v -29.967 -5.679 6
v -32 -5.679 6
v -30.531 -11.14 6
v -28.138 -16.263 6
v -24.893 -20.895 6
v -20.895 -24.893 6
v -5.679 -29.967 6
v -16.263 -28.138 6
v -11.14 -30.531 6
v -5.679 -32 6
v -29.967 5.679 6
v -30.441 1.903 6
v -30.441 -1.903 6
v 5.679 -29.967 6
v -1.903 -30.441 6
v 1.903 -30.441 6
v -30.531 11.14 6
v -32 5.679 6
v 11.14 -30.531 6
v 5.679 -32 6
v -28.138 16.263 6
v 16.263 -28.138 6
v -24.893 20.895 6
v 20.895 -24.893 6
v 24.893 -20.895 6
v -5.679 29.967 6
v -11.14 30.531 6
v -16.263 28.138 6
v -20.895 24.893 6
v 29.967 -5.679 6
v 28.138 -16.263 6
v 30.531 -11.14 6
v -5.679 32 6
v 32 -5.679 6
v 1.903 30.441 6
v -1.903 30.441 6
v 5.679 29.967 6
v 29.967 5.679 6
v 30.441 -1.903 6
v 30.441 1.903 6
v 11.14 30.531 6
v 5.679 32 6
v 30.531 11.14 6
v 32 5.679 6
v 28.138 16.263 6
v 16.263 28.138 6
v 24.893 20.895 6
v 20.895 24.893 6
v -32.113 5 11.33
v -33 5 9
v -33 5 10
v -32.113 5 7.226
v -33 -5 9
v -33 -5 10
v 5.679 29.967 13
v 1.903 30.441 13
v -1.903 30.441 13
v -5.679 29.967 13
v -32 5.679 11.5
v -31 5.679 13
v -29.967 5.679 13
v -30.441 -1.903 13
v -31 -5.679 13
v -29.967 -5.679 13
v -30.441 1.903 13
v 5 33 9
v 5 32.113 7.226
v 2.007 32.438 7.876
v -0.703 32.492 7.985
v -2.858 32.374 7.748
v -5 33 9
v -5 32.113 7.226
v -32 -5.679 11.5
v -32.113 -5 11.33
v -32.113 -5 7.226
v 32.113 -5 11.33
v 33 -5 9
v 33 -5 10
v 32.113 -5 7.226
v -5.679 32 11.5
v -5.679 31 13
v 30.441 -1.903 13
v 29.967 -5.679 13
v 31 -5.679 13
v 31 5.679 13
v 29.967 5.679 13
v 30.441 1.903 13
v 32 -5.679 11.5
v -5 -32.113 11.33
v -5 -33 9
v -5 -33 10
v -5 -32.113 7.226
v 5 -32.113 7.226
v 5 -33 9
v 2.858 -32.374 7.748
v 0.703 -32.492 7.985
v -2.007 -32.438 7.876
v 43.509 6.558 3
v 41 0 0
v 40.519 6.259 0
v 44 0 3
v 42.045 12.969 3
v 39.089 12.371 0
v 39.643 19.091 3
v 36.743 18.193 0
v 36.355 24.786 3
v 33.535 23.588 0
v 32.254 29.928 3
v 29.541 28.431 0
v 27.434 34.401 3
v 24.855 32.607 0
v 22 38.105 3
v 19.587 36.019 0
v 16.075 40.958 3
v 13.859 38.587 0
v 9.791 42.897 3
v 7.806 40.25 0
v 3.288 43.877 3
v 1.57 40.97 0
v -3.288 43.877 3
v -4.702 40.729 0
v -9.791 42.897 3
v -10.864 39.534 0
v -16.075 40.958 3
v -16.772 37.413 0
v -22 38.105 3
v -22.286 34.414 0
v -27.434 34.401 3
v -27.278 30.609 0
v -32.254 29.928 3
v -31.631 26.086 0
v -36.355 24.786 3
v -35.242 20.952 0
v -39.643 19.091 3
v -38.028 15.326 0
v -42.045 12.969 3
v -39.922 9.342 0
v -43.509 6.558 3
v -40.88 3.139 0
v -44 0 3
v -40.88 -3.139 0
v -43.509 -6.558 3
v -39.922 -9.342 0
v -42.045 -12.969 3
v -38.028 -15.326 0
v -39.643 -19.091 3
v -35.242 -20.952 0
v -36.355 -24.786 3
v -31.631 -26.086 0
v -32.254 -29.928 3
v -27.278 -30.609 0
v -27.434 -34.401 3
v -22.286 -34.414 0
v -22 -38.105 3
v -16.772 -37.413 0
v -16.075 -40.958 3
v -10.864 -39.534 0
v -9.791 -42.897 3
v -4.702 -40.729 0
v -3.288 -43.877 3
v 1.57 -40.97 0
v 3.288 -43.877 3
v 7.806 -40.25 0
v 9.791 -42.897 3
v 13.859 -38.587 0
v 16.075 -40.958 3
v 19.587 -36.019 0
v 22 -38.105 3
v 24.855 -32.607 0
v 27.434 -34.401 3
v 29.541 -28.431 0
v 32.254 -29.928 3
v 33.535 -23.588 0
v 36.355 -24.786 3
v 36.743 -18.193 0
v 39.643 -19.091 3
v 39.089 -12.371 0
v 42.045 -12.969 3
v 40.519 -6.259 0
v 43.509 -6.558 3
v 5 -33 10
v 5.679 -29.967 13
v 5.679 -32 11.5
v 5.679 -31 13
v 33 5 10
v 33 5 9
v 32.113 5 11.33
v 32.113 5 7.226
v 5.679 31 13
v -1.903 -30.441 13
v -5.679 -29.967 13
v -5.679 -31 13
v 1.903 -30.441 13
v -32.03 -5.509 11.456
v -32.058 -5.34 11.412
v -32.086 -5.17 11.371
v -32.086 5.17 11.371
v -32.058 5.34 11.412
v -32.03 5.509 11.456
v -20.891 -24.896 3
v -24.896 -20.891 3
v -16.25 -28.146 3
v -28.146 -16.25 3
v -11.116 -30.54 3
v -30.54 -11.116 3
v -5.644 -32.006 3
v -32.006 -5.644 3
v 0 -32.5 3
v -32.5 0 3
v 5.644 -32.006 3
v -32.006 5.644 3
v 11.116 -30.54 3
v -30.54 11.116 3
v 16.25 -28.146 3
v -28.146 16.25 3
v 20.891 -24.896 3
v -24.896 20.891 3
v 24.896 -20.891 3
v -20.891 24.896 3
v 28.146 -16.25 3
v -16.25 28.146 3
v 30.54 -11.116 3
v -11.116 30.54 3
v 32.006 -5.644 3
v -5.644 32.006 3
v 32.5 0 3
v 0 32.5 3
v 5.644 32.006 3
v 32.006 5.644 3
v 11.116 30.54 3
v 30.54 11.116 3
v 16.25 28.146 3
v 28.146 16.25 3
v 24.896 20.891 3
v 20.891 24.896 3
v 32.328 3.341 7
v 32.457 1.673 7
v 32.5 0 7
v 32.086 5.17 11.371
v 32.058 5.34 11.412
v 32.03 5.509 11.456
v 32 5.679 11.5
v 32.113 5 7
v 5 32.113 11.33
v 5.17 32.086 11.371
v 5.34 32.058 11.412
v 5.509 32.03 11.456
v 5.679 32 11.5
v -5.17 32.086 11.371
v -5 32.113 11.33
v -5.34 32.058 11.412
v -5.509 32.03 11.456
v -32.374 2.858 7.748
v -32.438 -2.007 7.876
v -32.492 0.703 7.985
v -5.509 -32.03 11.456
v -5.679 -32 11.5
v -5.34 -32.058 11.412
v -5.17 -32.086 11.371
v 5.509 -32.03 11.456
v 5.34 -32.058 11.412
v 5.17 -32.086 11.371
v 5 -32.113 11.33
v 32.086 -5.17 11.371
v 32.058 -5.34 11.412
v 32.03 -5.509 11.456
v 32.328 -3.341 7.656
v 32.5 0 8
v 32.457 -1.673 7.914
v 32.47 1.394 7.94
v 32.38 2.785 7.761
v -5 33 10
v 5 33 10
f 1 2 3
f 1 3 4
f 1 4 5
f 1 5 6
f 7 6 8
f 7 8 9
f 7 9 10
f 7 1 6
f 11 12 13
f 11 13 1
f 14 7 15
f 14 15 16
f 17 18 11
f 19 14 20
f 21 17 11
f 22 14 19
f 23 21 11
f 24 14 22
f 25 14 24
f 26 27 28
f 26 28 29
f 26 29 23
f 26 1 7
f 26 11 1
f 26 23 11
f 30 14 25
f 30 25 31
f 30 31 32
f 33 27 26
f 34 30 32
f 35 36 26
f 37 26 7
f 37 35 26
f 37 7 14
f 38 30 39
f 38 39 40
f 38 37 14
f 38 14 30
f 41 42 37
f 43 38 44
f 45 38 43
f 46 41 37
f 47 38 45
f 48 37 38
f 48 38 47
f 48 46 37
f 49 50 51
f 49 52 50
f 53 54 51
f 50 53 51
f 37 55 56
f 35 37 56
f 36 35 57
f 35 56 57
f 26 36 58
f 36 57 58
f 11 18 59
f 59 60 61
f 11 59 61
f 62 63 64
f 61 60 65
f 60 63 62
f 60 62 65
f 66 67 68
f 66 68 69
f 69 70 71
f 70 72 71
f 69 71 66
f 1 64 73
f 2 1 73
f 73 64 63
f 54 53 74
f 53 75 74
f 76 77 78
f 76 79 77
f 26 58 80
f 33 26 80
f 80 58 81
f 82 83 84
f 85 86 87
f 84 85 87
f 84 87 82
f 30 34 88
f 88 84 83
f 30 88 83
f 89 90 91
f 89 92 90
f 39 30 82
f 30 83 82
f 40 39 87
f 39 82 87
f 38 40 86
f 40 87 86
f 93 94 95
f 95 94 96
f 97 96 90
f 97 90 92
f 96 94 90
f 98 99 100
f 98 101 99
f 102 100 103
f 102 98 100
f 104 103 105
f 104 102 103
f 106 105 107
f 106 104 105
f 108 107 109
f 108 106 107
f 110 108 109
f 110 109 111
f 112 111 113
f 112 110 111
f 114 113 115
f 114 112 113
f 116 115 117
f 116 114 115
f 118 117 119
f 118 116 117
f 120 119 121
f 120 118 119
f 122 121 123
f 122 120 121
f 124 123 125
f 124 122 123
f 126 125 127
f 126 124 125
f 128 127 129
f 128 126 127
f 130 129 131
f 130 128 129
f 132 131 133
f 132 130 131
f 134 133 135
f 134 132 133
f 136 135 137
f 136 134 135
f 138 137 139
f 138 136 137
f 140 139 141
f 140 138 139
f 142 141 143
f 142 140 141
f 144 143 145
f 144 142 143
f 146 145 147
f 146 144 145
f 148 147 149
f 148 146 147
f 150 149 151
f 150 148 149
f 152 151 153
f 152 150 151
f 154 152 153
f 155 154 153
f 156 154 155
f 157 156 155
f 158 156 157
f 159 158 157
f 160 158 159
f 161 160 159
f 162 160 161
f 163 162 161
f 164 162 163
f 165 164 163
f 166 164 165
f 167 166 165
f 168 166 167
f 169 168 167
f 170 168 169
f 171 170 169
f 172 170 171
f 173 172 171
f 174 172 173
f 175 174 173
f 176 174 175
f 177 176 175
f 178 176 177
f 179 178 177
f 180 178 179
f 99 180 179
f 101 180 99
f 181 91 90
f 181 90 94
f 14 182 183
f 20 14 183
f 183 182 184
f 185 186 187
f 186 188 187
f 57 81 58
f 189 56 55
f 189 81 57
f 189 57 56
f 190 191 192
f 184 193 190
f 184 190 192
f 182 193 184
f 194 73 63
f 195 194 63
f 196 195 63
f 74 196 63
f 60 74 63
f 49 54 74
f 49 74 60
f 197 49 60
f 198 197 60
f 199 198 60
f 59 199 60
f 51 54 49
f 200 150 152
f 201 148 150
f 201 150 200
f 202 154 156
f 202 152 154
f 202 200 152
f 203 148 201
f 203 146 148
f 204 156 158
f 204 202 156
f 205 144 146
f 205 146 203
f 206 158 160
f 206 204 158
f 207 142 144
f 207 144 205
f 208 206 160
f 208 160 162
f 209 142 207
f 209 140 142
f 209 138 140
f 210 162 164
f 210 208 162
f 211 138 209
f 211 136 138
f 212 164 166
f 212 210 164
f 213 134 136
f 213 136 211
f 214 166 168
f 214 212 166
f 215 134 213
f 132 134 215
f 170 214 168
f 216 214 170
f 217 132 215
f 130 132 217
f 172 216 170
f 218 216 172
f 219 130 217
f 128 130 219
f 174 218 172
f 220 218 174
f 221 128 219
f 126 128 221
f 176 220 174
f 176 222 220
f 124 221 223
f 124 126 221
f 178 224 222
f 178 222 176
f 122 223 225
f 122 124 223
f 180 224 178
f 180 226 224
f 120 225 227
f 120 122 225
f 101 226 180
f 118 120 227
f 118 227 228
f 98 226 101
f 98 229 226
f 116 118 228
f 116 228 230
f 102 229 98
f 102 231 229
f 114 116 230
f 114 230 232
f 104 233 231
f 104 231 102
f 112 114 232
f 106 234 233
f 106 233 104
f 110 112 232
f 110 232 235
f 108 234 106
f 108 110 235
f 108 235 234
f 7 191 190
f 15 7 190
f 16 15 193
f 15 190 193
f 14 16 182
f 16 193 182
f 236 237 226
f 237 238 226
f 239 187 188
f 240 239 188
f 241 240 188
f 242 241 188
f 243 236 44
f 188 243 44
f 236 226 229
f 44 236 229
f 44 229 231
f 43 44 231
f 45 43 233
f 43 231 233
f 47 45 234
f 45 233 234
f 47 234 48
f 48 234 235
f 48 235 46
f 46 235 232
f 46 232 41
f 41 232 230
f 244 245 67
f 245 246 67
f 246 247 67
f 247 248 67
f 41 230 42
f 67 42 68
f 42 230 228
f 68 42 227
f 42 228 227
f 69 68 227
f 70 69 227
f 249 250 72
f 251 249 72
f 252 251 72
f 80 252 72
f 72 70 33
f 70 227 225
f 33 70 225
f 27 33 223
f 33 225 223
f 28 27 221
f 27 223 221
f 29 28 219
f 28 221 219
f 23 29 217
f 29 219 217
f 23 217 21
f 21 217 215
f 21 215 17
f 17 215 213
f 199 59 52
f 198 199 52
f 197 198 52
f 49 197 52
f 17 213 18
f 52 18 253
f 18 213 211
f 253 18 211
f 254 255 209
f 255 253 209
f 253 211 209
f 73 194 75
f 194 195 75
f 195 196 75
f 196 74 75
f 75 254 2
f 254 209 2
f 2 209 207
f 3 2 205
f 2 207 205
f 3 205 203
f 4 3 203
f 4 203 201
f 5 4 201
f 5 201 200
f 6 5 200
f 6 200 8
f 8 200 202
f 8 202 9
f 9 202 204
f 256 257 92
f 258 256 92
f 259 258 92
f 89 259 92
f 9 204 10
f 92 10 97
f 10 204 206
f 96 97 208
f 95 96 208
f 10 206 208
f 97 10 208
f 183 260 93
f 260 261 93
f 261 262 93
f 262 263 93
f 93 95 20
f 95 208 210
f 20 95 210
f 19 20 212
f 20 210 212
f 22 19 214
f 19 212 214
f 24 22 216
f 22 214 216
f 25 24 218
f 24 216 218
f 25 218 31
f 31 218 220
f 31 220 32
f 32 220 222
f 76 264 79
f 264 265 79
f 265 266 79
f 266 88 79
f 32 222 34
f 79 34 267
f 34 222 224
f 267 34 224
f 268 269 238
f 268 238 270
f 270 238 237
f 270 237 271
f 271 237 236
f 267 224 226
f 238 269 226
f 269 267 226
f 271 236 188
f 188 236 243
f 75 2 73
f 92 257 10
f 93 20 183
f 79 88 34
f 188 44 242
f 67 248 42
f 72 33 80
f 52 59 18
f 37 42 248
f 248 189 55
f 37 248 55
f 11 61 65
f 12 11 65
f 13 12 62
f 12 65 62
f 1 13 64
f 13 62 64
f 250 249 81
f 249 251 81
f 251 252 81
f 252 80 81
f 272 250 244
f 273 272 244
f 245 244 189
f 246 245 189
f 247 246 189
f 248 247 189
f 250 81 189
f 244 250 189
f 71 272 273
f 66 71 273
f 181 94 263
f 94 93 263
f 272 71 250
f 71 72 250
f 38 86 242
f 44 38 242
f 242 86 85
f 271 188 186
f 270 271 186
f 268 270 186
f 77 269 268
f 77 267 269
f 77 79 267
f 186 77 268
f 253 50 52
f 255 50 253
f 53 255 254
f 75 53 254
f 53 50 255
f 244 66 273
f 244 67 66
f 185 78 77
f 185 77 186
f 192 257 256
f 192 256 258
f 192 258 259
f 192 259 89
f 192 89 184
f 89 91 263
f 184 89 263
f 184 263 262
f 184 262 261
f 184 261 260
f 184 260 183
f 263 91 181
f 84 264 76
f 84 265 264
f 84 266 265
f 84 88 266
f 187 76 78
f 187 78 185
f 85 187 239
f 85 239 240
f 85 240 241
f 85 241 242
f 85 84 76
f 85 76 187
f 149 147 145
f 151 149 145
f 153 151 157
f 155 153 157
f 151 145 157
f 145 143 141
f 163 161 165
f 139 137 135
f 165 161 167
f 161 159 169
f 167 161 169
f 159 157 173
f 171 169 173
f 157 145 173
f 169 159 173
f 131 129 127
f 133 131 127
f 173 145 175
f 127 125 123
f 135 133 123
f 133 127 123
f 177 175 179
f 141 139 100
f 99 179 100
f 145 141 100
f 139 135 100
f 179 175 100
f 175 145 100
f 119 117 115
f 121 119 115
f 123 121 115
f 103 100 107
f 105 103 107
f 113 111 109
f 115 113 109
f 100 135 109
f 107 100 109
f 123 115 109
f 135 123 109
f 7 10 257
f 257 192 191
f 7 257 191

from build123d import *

# Parameters (mm, degrees)
F0_R          = 41
F1_DEPTH      = 3
F1_TAPER      = -45
F2_R          = 32.5
F3_DEPTH      = 10
F4_W          = 10
F4_H          = 6
F6_DEPTH      = 33
F6_DEPTH_BACK = 33
F7_W          = 10
F7_H          = 6
F8_DEPTH      = 33
F8_DEPTH_BACK = 33
F5_R          = 30.5
F9_DEPTH      = 7
F12_DEPTH     = 7
F13_SIZE2     = 2
F13_SIZE      = 3
F13_2_SIZE2   = 2
F13_2_SIZE    = 3
F14_SIZE2     = 3
F14_SIZE      = 2
F14_2_SIZE2   = 3
F14_2_SIZE    = 2
F15_T4_DEPTH  = 20.3593154951
F15_S5_R      = 32.5
F15_T6_DEPTH  = 12
F15_T10_DEPTH = 20.3593154951
F15_S11_R     = 32.5
F15_T12_DEPTH = 12
F16_T4_DEPTH  = 20.3593154951
F16_S5_R      = 32.5
F16_T6_DEPTH  = 12
F16_T10_DEPTH = 20.3593154951
F16_S11_R     = 32.5
F16_T12_DEPTH = 12


# Not quite as in the source:
# - a fillet or chamfer that OpenCascade refuses, or shapes differently, is made with other operations: its cross-section is extruded or revolved along the edge and cut away or added


with BuildPart() as f1:
    # F0 (on Top) → F1 (new body)
    with BuildSketch(Plane.XY):
        Circle(F0_R)
    extrude(amount=F1_DEPTH, taper=F1_TAPER)

    # F2 (on face) → F3 (join)
    with BuildSketch(Plane.XY.offset(3)):
        Circle(F2_R)
    extrude(amount=F3_DEPTH)

    # F4 (on Front) → F6 (join, two sides)
    with BuildSketch(Plane.XZ) as f6_sk:
        with Locations((0, 10)):
            Rectangle(F4_W, F4_H)
    extrude(amount=F6_DEPTH)
    extrude(f6_sk.sketch, amount=-F6_DEPTH_BACK)

    # F7 (on Right) → F8 (join, two sides)
    with BuildSketch(Plane.YZ) as f8_sk:
        with Locations((0, 10)):
            Rectangle(F7_W, F7_H)
    extrude(amount=F8_DEPTH)
    extrude(f8_sk.sketch, amount=-F8_DEPTH_BACK)

    # F5 (on face) → F9 (cut)
    with BuildSketch(Plane.XY.offset(13)):
        Circle(F5_R)
    extrude(amount=-F9_DEPTH, mode=Mode.SUBTRACT)

    # F11 (on face) → F12 (cut)
    with BuildSketch(Plane.XY.offset(13)):
        with BuildLine():
            ThreePointArc((-5.6789083458, 32), (-22.9809703886, 22.9809703886), (-32, 5.6789083458))
            Line((-32, 5.6789083458), (-29.9666481275, 5.6789083458))
            ThreePointArc((-29.9666481275, 5.6789083458), (-21.5667568262, 21.5667568262), (-5.6789083458, 29.9666481275))
            Line((-5.6789083458, 29.9666481275), (-5.6789083458, 32))
        make_face()
        with BuildLine():
            ThreePointArc((-5.6789083458, 29.9666481275), (-21.5667568262, 21.5667568262), (-29.9666481275, 5.6789083458))
            ThreePointArc((-29.9666481275, 5.6789083458), (-30.5, 0), (-29.9666481275, -5.6789083458))
            ThreePointArc((-29.9666481275, -5.6789083458), (-21.5667568262, -21.5667568262), (-5.6789083458, -29.9666481275))
            ThreePointArc((-5.6789083458, -29.9666481275), (0, -30.5), (5.6789083458, -29.9666481275))
            ThreePointArc((5.6789083458, -29.9666481275), (21.5667568262, -21.5667568262), (29.9666481275, -5.6789083458))
            ThreePointArc((29.9666481275, -5.6789083458), (30.3663692915, -2.8519495183), (30.5, 0))
            ThreePointArc((30.5, 0), (30.3663692915, 2.8519495183), (29.9666481275, 5.6789083458))
            ThreePointArc((29.9666481275, 5.6789083458), (21.5667568262, 21.5667568262), (5.6789083458, 29.9666481275))
            ThreePointArc((5.6789083458, 29.9666481275), (0, 30.5), (-5.6789083458, 29.9666481275))
        make_face()
        with BuildLine():
            Line((5.6789083458, 32), (5.6789083458, 29.9666481275))
            ThreePointArc((5.6789083458, 29.9666481275), (21.5667568262, 21.5667568262), (29.9666481275, 5.6789083458))
            Line((29.9666481275, 5.6789083458), (32, 5.6789083458))
            ThreePointArc((32, 5.6789083458), (22.9809703886, 22.9809703886), (5.6789083458, 32))
        make_face()
        with BuildLine():
            ThreePointArc((29.9666481275, -5.6789083458), (21.5667568262, -21.5667568262), (5.6789083458, -29.9666481275))
            Line((5.6789083458, -29.9666481275), (5.6789083458, -32))
            ThreePointArc((5.6789083458, -32), (22.9809703886, -22.9809703886), (32, -5.6789083458))
            Line((32, -5.6789083458), (29.9666481275, -5.6789083458))
        make_face()
        with BuildLine():
            ThreePointArc((-5.6789083458, -29.9666481275), (-21.5667568262, -21.5667568262), (-29.9666481275, -5.6789083458))
            Line((-29.9666481275, -5.6789083458), (-32, -5.6789083458))
            ThreePointArc((-32, -5.6789083458), (-22.9809703886, -22.9809703886), (-5.6789083458, -32))
            Line((-5.6789083458, -32), (-5.6789083458, -29.9666481275))
        make_face()
    extrude(amount=-F12_DEPTH, mode=Mode.SUBTRACT)

    # F13
    f13_edges = [f1.edges().sort_by_distance(p)[0] for p in [
        (0, 33, 13),
    ]]
    f13_side = f1.faces().sort_by_distance((0, 33, 10))[0]
    chamfer(f13_edges, length=F13_SIZE, length2=F13_SIZE2, reference=f13_side)

    # F13#2
    f13_2_edges = [f1.edges().sort_by_distance(p)[0] for p in [
        (33, 0, 13),
    ]]
    f13_2_side = f1.faces().sort_by_distance((33, 0, 10))[0]
    chamfer(f13_2_edges, length=F13_2_SIZE, length2=F13_2_SIZE2, reference=f13_2_side)

    # F14
    f14_edges = [f1.edges().sort_by_distance(p)[0] for p in [
        (0, -33, 13),
    ]]
    f14_side = f1.faces().sort_by_distance((0, -31.618427, 13))[0]
    chamfer(f14_edges, length=F14_SIZE, length2=F14_SIZE2, reference=f14_side)

    # F14#2
    f14_2_edges = [f1.edges().sort_by_distance(p)[0] for p in [
        (-33, 0, 13),
    ]]
    f14_2_side = f1.faces().sort_by_distance((-31.618427, 0, 13))[0]
    chamfer(f14_2_edges, length=F14_2_SIZE, length2=F14_2_SIZE2, reference=f14_2_side)

    # F15: chamfer of 1 x 2 on 2 edges, made by hand


with BuildPart() as f15_tool2:
    # F15_s3 → F15_t4 (new body)
    with BuildSketch(Plane.XZ.offset(10.1796577476)):
        Polygon((32, 7), (33, 9), (33, 7), align=None)
    extrude(amount=-F15_T4_DEPTH)

    # F15_s5 → F15_t6 (cut, symmetric)
    with BuildSketch(Plane.XY.offset(8)):
        Circle(F15_S5_R)
    extrude(amount=F15_T6_DEPTH, both=True, mode=Mode.SUBTRACT)


with BuildPart() as f1_1:
    add(f1.part)

    # F15_t1: cut F15_tool2
    add(f15_tool2.part, mode=Mode.SUBTRACT)


with BuildPart() as f15_tool8:
    # F15_s9 → F15_t10 (new body)
    with BuildSketch(Plane.YZ.offset(-10.1796577476)):
        Polygon((32, 7), (33, 9), (33, 7), align=None)
    extrude(amount=F15_T10_DEPTH)

    # F15_s11 → F15_t12 (cut, symmetric)
    with BuildSketch(Plane.XY.offset(8)):
        Circle(F15_S11_R)
    extrude(amount=F15_T12_DEPTH, both=True, mode=Mode.SUBTRACT)


with BuildPart() as f1_2:
    add(f1_1.part)

    # F15_t7: cut F15_tool8
    add(f15_tool8.part, mode=Mode.SUBTRACT)

    # F16: chamfer of 2 x 1 on 2 edges, made by hand


with BuildPart() as f16_tool2:
    # F16_s3 → F16_t4 (new body)
    with BuildSketch(Plane.YZ.offset(-10.1796577476)):
        Polygon((-33, 9), (-32, 7), (-33, 7), align=None)
    extrude(amount=F16_T4_DEPTH)

    # F16_s5 → F16_t6 (cut, symmetric)
    with BuildSketch(Plane.XY.offset(8)):
        Circle(F16_S5_R)
    extrude(amount=F16_T6_DEPTH, both=True, mode=Mode.SUBTRACT)


with BuildPart() as f1_3:
    add(f1_2.part)

    # F16_t1: cut F16_tool2
    add(f16_tool2.part, mode=Mode.SUBTRACT)


with BuildPart() as f16_tool8:
    # F16_s9 → F16_t10 (new body)
    with BuildSketch(Plane.XZ.offset(10.1796577476)):
        Polygon((-33, 9), (-32, 7), (-33, 7), align=None)
    extrude(amount=-F16_T10_DEPTH)

    # F16_s11 → F16_t12 (cut, symmetric)
    with BuildSketch(Plane.XY.offset(8)):
        Circle(F16_S11_R)
    extrude(amount=F16_T12_DEPTH, both=True, mode=Mode.SUBTRACT)


with BuildPart() as f1_4:
    add(f1_3.part)

    # F16_t7: cut F16_tool8
    add(f16_tool8.part, mode=Mode.SUBTRACT)


solid = f1_4.part
